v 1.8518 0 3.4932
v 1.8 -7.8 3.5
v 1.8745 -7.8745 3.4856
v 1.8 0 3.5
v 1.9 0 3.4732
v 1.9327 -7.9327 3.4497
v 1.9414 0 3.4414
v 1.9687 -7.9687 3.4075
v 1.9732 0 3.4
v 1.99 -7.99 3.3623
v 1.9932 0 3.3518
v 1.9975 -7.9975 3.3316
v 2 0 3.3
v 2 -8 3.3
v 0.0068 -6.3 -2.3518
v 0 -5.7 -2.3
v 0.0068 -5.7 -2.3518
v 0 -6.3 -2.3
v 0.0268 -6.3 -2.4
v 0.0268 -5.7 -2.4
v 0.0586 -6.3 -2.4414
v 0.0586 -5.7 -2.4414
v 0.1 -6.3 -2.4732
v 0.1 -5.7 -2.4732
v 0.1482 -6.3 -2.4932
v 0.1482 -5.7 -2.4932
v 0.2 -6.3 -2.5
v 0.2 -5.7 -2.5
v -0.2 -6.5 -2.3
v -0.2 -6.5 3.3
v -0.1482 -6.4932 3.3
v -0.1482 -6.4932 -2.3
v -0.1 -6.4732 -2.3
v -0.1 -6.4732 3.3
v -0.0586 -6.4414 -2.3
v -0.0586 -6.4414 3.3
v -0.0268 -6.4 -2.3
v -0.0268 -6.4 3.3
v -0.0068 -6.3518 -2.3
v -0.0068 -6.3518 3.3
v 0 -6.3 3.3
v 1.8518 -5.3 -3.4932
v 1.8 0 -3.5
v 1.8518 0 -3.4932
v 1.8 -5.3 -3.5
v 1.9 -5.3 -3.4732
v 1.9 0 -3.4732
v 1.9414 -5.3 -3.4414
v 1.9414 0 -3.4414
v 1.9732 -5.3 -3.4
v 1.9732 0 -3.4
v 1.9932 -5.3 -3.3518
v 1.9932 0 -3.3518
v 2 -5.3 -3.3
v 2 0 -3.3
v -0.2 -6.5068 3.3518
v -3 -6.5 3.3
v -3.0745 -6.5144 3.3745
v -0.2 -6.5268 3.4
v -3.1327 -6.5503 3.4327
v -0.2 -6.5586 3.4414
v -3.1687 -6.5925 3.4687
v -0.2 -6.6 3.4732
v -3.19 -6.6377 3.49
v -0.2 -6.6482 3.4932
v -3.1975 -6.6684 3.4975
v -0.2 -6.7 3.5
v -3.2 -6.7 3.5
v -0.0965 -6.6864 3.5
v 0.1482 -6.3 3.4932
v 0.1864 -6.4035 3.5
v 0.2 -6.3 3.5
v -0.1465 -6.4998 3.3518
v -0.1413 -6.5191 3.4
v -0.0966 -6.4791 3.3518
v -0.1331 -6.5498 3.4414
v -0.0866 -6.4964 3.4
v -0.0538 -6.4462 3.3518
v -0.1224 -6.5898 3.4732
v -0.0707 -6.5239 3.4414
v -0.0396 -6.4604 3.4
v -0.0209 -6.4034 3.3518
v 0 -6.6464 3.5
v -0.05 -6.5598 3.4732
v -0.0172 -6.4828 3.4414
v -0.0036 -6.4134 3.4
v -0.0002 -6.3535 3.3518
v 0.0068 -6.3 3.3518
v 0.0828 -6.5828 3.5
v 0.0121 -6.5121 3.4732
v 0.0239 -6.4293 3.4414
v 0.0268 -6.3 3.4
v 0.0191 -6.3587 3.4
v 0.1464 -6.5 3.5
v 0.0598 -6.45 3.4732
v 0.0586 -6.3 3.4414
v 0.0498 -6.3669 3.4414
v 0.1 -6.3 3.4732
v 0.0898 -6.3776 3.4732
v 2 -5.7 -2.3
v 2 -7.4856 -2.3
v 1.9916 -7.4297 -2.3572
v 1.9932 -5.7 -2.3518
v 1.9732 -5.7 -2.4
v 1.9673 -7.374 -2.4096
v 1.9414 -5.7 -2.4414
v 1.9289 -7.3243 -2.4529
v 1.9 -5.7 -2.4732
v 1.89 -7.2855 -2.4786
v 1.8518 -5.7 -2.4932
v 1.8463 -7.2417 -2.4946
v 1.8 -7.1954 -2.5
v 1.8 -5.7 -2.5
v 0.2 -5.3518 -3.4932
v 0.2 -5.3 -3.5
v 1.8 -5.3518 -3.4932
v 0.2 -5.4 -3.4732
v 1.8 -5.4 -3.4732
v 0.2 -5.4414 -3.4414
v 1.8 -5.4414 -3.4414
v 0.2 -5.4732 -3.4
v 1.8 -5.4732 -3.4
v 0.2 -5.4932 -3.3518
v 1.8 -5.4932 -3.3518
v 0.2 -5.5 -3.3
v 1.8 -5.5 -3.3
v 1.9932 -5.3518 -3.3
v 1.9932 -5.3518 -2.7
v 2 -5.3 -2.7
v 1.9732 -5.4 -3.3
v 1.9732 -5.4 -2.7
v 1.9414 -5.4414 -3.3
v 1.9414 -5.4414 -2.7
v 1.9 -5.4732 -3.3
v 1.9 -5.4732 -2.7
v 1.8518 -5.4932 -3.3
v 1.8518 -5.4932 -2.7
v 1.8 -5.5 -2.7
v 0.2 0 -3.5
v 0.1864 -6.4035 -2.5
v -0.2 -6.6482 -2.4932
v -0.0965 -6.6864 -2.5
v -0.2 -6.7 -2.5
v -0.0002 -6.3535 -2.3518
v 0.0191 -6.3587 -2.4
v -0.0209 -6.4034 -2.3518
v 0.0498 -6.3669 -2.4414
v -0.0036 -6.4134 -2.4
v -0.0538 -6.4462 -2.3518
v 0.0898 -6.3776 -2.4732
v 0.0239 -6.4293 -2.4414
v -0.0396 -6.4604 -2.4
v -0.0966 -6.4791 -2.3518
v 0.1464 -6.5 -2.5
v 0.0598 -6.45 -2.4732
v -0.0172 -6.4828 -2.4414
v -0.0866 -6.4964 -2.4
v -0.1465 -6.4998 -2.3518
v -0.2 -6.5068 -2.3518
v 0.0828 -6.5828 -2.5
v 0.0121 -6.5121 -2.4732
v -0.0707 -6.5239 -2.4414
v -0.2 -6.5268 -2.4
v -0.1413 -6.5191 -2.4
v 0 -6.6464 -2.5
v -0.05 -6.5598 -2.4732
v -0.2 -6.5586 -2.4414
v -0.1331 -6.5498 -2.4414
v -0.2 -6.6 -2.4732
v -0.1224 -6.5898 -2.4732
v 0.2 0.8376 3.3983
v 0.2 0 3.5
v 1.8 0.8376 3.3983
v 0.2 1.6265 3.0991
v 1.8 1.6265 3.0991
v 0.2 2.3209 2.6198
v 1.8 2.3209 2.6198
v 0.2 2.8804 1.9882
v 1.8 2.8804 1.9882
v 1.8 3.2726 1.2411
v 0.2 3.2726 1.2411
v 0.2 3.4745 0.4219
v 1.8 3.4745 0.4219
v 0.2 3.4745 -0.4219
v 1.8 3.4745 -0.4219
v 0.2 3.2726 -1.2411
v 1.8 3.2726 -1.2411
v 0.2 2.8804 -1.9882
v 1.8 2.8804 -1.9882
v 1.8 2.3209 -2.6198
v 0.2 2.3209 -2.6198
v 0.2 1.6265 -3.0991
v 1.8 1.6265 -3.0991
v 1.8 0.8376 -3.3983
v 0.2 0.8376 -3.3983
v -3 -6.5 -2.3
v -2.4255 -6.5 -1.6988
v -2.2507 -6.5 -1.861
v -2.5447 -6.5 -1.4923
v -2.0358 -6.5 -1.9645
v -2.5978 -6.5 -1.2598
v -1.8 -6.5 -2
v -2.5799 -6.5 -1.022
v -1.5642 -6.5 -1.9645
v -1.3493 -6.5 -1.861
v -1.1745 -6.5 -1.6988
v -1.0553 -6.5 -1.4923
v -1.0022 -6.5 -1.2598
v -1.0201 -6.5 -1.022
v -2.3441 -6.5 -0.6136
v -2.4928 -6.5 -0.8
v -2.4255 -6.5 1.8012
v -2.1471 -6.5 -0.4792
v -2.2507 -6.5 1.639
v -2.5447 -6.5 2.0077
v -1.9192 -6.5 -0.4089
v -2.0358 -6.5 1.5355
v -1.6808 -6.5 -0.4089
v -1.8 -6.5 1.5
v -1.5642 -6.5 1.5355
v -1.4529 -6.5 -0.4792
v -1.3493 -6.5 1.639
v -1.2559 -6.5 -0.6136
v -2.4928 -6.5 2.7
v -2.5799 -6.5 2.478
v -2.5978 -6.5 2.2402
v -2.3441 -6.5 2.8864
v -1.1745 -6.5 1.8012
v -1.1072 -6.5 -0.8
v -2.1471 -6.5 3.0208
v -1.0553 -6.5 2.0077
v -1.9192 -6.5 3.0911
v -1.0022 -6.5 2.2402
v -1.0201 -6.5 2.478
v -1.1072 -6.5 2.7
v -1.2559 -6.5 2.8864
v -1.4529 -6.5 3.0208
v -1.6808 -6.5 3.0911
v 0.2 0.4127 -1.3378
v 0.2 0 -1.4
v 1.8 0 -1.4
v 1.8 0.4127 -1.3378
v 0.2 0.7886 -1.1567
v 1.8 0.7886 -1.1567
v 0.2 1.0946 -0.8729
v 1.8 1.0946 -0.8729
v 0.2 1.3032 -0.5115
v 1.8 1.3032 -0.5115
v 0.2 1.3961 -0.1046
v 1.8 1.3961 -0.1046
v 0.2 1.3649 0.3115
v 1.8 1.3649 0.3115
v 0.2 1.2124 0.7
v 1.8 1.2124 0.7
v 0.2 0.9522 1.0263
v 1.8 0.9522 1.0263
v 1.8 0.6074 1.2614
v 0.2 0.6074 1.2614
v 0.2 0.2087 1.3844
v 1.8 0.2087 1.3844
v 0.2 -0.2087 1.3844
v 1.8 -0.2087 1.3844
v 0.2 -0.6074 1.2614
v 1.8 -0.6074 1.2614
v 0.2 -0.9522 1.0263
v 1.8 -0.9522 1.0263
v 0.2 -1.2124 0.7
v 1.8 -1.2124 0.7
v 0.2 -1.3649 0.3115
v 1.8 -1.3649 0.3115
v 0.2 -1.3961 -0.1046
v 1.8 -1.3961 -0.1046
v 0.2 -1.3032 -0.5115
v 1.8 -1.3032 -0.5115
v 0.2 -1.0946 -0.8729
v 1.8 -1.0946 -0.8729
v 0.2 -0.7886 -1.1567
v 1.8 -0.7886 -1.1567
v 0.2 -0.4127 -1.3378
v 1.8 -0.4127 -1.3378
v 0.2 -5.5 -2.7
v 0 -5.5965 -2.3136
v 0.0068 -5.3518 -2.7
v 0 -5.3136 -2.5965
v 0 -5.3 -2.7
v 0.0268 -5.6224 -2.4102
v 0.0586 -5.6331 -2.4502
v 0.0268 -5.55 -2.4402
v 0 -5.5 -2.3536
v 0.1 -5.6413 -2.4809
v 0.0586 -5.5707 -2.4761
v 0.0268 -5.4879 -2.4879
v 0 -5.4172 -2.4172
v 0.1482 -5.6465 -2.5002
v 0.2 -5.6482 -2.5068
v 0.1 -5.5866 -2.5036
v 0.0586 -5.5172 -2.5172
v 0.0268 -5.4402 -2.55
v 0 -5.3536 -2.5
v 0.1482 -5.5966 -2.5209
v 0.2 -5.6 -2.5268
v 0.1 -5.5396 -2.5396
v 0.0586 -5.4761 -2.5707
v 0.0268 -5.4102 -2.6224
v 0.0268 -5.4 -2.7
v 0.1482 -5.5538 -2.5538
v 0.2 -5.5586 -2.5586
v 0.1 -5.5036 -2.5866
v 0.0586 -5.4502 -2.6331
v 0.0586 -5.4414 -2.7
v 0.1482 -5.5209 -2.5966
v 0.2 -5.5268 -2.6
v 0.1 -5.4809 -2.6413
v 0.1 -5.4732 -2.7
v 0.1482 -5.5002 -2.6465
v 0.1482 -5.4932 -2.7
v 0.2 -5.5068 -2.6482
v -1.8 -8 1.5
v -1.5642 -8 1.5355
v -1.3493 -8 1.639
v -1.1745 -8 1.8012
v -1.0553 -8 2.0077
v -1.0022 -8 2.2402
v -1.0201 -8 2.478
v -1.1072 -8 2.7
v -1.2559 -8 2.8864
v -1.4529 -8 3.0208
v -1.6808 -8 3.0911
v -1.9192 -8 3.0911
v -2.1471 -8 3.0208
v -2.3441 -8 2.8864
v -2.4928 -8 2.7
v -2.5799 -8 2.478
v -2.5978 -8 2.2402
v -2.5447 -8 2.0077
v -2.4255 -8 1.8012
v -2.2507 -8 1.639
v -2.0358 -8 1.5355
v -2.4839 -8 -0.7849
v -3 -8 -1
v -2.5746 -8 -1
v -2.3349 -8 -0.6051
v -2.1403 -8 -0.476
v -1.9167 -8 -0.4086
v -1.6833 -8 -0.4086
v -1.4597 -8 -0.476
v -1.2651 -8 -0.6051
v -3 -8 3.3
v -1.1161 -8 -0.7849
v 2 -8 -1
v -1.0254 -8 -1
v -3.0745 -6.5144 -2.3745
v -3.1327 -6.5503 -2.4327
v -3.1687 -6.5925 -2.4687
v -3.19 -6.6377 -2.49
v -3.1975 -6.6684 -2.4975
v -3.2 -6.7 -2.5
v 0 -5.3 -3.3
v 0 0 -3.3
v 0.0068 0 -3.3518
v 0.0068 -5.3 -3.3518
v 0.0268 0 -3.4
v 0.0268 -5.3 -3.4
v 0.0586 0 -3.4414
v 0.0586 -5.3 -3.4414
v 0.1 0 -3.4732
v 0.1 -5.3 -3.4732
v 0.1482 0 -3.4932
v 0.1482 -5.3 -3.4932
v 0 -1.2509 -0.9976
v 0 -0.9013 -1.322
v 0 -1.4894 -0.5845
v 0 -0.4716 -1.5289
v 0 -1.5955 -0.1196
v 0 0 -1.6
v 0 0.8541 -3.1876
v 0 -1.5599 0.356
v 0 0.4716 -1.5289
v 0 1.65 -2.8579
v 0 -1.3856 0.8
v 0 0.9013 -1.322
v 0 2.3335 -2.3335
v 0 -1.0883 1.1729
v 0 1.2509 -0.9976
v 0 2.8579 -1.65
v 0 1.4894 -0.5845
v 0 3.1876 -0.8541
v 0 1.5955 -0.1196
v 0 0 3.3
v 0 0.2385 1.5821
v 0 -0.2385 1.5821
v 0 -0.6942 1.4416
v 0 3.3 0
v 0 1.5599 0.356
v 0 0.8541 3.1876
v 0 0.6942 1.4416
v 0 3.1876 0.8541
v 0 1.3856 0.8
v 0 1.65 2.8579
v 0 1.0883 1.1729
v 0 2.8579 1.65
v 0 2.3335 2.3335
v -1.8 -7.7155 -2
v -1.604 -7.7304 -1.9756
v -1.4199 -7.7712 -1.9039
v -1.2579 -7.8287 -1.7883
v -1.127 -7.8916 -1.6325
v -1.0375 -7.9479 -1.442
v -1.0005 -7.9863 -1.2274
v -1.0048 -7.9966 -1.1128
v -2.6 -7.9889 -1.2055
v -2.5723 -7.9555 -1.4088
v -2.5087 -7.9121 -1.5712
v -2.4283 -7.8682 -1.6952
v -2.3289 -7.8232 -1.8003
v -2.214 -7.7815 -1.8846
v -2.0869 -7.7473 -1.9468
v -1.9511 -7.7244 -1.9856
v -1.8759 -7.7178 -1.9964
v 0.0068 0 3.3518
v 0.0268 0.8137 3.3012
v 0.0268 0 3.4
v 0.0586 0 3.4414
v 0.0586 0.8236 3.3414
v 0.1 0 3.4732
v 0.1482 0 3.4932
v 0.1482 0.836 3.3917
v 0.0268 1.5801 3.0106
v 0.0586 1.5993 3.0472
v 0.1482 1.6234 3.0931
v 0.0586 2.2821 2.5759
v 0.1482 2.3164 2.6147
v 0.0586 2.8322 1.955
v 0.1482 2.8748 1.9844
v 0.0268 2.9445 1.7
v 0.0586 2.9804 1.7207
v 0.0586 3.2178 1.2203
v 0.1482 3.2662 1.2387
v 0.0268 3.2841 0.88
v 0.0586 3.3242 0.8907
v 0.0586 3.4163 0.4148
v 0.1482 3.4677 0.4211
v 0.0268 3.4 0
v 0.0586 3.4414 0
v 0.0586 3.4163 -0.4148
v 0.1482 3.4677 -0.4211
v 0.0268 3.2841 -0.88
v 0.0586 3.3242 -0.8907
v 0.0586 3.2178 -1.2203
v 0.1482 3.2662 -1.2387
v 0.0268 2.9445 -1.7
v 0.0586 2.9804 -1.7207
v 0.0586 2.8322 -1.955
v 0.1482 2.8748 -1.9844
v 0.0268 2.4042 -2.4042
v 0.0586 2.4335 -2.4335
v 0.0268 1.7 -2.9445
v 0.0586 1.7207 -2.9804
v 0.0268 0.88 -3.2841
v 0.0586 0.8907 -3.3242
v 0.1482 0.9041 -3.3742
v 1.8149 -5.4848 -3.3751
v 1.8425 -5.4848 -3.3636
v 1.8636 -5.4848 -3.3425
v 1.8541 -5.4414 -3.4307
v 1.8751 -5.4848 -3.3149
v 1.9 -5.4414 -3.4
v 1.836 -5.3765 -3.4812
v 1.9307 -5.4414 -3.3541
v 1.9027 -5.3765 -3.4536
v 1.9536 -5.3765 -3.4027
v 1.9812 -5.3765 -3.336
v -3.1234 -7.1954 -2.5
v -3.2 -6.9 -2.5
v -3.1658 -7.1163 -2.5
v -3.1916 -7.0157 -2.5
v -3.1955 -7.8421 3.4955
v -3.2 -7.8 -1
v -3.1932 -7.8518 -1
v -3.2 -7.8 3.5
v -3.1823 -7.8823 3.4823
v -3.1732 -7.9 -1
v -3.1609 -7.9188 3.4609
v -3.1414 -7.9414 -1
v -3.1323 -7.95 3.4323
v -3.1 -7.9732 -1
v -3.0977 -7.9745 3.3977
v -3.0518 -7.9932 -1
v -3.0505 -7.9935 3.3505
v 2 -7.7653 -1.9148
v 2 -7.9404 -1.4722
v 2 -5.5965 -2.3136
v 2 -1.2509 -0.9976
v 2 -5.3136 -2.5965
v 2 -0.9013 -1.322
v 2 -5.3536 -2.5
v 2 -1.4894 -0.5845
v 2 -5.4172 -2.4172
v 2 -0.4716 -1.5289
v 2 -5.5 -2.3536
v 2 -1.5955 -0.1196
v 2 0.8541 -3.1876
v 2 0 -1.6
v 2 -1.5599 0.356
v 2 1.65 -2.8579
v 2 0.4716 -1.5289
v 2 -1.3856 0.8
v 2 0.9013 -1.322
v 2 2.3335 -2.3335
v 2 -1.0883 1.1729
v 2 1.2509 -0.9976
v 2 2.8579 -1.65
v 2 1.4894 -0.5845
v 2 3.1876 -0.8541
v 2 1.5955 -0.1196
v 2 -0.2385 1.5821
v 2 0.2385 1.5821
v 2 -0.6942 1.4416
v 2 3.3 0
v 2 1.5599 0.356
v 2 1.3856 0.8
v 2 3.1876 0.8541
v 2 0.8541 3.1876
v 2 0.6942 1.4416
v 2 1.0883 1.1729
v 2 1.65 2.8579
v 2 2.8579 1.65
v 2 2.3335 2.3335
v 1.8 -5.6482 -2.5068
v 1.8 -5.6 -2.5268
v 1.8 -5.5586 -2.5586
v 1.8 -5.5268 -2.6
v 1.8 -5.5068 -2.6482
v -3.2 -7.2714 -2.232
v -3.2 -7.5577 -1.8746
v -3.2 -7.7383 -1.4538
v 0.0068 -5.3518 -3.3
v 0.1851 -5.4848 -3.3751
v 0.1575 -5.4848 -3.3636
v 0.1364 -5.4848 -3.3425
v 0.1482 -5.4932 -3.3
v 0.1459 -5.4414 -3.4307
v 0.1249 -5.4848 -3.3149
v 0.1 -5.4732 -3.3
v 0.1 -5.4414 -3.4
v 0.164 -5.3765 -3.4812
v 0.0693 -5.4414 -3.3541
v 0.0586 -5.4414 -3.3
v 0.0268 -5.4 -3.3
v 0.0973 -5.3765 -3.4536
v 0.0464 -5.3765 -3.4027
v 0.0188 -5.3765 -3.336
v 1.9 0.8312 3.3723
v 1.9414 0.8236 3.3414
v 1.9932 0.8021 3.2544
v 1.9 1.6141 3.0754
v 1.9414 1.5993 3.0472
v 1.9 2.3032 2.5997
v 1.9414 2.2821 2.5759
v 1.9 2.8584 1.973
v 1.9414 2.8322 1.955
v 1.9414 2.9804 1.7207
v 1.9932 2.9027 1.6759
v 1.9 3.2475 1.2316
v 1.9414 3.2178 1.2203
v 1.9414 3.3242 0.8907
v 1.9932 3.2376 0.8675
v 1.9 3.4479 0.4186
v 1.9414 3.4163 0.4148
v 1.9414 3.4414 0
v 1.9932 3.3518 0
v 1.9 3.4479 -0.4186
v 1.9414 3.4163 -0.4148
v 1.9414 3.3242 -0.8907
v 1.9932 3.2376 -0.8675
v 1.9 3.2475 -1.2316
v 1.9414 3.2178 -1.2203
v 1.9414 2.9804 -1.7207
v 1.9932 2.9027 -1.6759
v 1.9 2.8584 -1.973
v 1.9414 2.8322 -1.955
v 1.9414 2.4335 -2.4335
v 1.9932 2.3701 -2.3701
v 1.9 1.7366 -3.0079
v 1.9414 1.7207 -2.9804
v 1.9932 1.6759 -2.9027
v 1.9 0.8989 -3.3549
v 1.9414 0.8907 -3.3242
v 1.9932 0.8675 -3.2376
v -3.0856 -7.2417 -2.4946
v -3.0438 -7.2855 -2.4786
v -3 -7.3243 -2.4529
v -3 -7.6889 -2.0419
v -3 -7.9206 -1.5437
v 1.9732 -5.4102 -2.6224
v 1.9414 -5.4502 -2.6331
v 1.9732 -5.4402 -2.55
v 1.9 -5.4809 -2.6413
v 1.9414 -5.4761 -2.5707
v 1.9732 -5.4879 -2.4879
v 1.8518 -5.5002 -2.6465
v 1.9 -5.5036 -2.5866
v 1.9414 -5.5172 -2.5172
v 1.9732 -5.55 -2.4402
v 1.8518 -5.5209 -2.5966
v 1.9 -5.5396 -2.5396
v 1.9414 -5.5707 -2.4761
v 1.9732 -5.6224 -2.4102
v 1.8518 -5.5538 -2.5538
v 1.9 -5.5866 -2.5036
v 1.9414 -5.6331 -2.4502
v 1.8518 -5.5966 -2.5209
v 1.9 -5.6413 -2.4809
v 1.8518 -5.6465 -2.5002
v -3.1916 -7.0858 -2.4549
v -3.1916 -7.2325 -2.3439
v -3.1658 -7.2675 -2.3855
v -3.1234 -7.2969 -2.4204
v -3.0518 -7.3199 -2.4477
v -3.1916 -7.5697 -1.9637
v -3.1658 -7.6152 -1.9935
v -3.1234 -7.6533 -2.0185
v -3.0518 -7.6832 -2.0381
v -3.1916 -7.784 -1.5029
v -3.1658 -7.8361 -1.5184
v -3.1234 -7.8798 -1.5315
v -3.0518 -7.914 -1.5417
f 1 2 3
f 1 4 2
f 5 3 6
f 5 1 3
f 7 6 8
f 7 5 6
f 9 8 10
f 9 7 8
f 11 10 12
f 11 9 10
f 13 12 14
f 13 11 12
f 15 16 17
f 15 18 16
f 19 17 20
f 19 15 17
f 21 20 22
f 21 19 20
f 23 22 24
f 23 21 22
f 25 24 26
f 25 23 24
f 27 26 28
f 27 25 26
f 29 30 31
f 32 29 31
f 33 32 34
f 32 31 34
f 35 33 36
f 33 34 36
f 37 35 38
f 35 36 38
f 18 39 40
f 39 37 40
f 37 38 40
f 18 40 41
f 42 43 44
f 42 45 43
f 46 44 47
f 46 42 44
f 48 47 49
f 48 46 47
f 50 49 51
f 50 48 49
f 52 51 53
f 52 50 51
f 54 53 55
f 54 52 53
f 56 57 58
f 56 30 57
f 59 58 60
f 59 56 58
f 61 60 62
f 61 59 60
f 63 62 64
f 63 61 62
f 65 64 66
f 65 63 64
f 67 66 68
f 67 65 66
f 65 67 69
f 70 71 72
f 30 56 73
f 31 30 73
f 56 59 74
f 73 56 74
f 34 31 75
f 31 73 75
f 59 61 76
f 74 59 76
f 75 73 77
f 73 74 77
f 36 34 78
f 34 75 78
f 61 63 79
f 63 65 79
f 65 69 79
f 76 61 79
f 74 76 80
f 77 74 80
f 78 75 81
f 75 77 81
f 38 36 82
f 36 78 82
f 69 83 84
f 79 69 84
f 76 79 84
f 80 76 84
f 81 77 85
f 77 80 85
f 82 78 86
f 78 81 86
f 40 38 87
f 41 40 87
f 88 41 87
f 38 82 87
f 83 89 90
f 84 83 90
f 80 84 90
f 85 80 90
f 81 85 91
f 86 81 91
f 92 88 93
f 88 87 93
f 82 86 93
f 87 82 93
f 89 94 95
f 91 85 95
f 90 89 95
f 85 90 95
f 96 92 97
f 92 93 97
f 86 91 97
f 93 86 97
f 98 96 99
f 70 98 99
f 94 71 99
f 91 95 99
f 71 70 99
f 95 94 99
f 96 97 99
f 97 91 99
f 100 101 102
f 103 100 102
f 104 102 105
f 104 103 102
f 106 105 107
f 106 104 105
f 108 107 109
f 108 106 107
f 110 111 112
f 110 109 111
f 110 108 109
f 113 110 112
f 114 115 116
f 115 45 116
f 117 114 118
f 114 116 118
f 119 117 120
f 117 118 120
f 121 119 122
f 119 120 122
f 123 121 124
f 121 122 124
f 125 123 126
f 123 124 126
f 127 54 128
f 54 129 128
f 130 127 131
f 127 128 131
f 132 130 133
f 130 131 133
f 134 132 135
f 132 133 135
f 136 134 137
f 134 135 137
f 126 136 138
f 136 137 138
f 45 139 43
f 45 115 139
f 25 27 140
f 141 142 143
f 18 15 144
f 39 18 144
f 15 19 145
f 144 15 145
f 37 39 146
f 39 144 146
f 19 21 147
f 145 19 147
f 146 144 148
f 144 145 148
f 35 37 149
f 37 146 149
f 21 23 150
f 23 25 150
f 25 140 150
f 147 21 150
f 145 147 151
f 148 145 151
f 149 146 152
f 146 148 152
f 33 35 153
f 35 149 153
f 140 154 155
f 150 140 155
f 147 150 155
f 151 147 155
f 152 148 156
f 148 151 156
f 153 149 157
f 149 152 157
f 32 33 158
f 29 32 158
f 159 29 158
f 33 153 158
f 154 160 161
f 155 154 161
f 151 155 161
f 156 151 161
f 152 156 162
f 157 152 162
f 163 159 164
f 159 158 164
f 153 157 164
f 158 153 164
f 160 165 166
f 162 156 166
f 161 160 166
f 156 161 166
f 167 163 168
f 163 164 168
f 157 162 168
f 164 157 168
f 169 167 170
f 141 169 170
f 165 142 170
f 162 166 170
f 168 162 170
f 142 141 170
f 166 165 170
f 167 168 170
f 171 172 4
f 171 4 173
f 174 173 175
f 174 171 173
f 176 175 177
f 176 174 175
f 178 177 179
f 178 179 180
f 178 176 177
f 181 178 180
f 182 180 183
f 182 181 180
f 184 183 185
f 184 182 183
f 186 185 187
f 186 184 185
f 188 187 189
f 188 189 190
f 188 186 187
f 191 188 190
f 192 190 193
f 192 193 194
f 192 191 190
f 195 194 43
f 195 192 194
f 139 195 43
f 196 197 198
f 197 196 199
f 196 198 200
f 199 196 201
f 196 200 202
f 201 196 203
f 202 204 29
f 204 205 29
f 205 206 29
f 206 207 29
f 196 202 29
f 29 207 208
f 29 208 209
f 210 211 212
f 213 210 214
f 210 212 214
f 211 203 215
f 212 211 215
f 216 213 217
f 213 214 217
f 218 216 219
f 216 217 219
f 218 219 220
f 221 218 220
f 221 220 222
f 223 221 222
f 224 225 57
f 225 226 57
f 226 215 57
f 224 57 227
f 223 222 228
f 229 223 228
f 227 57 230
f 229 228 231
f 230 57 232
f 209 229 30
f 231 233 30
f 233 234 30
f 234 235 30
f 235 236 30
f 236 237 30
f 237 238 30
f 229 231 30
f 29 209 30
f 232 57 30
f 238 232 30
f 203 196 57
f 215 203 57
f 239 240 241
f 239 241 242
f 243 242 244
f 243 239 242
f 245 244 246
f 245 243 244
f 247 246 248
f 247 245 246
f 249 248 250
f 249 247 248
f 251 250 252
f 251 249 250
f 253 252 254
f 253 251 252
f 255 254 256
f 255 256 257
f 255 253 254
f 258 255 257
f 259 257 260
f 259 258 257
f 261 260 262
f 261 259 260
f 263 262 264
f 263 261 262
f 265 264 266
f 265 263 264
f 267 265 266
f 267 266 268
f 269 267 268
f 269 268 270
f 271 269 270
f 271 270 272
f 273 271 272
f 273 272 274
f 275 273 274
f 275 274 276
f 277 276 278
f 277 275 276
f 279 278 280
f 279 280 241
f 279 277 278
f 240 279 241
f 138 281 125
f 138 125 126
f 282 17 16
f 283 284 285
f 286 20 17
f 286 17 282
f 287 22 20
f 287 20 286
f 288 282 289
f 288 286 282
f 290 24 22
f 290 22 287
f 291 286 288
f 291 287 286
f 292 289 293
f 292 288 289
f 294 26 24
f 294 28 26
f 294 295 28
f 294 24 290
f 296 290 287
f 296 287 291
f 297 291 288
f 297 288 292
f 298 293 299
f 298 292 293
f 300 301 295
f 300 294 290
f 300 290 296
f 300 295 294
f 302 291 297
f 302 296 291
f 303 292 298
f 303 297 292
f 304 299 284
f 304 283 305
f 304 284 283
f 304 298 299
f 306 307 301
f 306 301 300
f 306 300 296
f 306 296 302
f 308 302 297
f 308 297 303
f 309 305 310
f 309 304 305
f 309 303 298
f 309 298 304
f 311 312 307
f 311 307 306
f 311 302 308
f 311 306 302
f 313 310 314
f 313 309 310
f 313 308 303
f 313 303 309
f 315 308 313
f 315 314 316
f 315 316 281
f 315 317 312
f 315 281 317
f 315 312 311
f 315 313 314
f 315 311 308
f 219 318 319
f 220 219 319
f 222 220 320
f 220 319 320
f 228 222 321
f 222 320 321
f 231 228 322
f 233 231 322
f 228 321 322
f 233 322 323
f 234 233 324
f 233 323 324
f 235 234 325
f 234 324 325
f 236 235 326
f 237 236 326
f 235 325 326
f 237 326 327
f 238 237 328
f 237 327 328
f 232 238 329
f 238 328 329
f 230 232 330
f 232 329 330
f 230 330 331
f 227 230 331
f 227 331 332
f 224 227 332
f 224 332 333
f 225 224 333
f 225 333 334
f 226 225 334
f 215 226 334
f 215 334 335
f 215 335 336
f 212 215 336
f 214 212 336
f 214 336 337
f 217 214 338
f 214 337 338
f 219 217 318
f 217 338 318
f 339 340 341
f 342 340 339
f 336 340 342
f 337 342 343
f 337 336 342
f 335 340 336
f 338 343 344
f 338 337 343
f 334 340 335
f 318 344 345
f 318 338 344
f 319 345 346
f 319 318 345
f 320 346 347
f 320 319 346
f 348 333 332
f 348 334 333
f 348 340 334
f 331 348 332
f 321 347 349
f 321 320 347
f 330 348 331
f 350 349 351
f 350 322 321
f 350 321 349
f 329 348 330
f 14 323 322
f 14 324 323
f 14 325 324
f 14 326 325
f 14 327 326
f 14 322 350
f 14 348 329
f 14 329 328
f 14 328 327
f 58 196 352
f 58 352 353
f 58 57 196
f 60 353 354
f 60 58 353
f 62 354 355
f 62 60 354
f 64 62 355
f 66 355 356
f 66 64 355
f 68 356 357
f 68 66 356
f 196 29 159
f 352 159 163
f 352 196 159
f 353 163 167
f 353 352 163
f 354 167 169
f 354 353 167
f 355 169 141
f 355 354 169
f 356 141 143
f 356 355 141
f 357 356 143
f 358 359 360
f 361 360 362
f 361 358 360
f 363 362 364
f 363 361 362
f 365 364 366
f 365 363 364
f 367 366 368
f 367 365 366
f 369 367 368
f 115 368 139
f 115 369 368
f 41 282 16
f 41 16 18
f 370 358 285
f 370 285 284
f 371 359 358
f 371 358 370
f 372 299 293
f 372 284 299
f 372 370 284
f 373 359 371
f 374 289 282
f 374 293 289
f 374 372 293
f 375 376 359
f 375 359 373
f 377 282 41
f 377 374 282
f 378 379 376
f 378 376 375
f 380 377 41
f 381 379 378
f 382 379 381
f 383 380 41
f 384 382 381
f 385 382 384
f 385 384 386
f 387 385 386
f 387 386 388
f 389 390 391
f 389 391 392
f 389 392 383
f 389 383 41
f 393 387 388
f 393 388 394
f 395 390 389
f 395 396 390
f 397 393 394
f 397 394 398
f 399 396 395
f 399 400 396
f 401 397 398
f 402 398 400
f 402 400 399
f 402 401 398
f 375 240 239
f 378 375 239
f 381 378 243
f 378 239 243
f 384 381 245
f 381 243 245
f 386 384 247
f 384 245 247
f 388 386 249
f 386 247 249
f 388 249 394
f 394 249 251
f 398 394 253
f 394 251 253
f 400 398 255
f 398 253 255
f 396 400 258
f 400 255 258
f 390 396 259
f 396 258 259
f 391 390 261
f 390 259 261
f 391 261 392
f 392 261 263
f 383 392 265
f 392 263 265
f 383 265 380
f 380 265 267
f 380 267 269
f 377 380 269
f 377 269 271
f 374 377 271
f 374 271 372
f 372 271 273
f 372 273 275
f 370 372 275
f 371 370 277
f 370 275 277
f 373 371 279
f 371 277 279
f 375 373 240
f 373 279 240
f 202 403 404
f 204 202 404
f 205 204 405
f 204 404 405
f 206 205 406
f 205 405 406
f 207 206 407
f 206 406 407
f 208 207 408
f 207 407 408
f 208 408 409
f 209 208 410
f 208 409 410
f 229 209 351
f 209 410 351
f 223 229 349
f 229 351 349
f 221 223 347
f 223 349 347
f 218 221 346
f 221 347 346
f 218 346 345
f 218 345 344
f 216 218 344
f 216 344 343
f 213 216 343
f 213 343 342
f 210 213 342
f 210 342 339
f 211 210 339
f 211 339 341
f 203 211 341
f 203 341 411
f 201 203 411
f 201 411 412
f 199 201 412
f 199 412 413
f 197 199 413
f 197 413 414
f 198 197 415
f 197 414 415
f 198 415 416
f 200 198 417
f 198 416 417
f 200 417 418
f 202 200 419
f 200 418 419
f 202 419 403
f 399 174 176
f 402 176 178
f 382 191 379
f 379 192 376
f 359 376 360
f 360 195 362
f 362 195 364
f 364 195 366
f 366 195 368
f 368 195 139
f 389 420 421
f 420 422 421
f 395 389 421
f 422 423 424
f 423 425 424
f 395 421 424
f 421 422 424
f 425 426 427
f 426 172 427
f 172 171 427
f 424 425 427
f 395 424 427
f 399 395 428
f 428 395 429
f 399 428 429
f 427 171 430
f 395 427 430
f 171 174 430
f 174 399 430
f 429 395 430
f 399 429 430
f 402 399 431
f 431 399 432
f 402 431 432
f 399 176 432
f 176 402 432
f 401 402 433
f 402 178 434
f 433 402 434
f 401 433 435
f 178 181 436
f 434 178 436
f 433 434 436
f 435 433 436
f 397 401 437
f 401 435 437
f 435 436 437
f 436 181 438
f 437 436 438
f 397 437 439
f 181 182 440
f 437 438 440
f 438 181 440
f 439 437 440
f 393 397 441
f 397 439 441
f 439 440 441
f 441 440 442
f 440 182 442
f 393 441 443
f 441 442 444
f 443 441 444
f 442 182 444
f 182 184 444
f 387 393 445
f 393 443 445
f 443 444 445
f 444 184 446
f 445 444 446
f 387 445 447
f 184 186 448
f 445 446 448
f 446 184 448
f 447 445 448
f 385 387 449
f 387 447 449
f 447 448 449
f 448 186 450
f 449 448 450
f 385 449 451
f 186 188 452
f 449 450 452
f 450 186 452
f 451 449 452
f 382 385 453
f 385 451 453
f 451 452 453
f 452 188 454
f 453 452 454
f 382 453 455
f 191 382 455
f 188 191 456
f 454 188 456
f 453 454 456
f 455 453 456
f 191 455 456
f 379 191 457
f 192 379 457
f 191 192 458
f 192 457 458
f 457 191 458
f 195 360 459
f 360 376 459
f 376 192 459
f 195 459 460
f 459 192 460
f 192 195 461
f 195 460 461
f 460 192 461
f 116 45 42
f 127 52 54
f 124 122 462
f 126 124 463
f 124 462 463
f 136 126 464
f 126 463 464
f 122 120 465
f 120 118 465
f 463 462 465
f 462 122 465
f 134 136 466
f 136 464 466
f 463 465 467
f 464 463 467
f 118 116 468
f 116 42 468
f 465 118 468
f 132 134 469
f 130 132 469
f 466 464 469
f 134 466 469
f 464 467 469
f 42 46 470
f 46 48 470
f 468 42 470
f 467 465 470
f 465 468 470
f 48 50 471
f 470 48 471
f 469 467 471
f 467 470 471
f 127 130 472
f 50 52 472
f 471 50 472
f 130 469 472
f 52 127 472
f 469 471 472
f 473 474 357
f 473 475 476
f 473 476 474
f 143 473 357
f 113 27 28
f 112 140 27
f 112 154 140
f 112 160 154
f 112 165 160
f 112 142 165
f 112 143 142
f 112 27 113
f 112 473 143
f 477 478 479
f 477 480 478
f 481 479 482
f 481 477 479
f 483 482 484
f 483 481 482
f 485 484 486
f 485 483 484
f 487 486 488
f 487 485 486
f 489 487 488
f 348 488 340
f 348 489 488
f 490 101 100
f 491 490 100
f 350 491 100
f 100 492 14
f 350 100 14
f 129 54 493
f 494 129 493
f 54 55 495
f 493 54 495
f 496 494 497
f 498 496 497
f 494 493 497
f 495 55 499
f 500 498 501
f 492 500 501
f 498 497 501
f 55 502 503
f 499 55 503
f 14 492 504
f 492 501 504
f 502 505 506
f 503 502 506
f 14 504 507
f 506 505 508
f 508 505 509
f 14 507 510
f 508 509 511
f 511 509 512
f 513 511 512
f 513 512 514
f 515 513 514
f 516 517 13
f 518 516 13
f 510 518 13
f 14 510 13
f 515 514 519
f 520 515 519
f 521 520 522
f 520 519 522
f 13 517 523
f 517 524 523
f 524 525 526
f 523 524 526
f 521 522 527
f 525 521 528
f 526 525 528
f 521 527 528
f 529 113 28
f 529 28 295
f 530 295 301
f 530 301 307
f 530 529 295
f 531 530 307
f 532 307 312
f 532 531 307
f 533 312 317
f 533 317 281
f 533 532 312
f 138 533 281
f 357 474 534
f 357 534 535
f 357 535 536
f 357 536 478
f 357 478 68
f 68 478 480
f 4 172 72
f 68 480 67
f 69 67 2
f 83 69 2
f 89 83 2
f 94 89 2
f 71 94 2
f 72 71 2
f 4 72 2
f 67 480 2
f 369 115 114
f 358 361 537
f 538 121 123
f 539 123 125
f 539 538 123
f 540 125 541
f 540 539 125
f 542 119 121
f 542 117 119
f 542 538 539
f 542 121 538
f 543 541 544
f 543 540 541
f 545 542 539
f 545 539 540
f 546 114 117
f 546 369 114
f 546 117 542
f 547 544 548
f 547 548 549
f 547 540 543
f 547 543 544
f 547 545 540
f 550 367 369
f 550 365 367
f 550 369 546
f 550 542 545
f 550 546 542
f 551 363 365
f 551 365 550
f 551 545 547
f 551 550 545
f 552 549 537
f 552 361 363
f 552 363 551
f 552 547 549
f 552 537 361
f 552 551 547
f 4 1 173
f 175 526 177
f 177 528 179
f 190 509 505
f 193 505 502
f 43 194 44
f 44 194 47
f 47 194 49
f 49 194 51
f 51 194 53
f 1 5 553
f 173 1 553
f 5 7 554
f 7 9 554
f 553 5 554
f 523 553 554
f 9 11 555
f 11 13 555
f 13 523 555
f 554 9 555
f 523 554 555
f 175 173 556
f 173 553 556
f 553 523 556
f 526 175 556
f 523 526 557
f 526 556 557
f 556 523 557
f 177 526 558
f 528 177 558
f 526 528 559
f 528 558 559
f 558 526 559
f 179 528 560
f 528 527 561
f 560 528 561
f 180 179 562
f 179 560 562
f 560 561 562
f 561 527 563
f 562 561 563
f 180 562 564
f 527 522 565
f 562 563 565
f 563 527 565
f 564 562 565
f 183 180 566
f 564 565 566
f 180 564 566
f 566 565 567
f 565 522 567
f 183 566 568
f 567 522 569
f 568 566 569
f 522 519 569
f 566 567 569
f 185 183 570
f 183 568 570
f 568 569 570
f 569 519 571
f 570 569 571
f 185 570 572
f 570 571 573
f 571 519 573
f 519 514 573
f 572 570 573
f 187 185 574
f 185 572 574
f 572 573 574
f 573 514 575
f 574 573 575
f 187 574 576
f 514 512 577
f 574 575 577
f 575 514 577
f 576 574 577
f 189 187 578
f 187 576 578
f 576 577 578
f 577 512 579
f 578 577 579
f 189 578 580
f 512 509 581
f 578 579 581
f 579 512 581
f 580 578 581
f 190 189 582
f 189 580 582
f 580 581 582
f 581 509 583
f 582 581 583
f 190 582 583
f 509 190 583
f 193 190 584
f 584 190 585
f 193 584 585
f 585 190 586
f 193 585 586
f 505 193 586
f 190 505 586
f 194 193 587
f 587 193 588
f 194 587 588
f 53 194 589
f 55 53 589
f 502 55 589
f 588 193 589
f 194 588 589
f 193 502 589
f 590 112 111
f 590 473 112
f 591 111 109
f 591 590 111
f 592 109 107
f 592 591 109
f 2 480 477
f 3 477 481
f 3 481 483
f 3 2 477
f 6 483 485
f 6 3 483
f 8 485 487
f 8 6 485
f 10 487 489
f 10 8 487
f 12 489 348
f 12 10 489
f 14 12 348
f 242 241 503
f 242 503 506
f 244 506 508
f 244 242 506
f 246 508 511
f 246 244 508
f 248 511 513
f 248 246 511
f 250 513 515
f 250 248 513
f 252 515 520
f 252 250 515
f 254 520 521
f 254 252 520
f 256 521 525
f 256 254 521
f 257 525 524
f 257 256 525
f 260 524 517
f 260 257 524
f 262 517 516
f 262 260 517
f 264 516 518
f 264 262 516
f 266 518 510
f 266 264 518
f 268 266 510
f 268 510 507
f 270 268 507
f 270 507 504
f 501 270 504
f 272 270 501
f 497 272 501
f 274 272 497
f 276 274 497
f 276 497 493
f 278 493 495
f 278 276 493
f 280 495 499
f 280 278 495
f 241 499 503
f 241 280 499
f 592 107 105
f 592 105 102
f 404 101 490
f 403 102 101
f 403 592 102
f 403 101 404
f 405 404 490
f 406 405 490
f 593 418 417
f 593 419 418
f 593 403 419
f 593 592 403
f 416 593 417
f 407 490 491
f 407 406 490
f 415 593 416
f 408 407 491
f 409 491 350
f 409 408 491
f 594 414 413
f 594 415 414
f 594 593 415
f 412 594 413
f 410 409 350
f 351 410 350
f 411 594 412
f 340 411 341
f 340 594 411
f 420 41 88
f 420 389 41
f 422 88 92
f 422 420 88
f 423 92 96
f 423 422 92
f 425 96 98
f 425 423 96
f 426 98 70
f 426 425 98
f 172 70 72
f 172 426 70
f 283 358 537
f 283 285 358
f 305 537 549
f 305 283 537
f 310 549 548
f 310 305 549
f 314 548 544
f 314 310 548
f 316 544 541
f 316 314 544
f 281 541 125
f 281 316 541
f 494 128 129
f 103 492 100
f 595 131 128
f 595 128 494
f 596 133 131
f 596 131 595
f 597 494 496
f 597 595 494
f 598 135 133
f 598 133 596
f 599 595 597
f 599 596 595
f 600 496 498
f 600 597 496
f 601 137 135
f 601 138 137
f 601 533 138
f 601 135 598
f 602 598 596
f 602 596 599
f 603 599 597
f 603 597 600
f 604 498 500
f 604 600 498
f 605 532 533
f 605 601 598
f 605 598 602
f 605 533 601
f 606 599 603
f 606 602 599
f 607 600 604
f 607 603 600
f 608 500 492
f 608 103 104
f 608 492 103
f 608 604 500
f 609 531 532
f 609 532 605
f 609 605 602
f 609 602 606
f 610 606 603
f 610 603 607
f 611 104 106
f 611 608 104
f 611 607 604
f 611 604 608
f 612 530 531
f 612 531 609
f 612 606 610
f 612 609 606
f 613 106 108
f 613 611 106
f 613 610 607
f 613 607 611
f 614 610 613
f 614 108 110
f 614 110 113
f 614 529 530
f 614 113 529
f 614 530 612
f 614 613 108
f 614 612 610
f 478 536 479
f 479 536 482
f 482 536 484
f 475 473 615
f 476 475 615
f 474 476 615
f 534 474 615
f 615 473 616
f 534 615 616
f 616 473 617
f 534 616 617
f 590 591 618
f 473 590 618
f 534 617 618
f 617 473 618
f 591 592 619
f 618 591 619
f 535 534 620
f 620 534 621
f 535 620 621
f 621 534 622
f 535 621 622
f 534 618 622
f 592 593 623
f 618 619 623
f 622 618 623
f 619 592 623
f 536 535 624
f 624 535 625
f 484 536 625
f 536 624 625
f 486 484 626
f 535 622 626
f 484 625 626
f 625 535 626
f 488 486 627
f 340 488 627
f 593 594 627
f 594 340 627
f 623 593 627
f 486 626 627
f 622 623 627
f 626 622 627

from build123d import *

# Parameters (mm, degrees)
SKETCH_1_R          = 1.4
EXTRUDE_1_DEPTH     = 2
SKETCH_2_W          = 5.2
SKETCH_2_H          = 7
SKETCH_2_R          = 0.8
EXTRUDE_2_DEPTH     = 1.5
SKETCH_5_W          = 6
SKETCH_5_H          = 1
CUT_EXTRUDE_1_DEPTH = 2.5
CUT_EXTRUDE_2_REACH = 12.163
FILLET_1_R          = 0.2
FILLET_2_R          = 0.2
CHAMFER_1_SIZE      = 0.2


with BuildPart() as part:
    # 草图1 → 凸台-拉伸1 (new body)
    with BuildSketch(Plane(origin=(0, 0, 0), x_dir=(0, 0, -1), z_dir=(1, 0, 0))):
        with BuildLine():
            Line((3.5, 0), (3.5, -8))
            Line((3.5, -8), (-3.5, -8))
            Line((-3.5, -8), (-3.5, 0))
            ThreePointArc((-3.5, 0), (0, 3.5), (3.5, 0))
        make_face()
        Circle(SKETCH_1_R, mode=Mode.SUBTRACT)
    extrude(amount=EXTRUDE_1_DEPTH)

    # 草图2 → 凸台-拉伸2 (add)
    with BuildSketch(Plane.XZ.offset(8)):
        with Locations((-0.6, 0)):
            Rectangle(SKETCH_2_W, SKETCH_2_H)
        with Locations(Location((-1.8, -1.2, 0), (0, 0, 270))):
            Circle(SKETCH_2_R, mode=Mode.SUBTRACT)
        with Locations(Location((-1.8, 2.3, 0), (0, 0, 270))):
            Circle(SKETCH_2_R, mode=Mode.SUBTRACT)
    extrude(amount=-EXTRUDE_2_DEPTH)

    # 草图5 → 切除-拉伸1 (cut)
    with BuildSketch(Plane.XZ.offset(8)):
        with Locations((-1, -3)):
            Rectangle(SKETCH_5_W, SKETCH_5_H)
    extrude(amount=-CUT_EXTRUDE_1_DEPTH, mode=Mode.SUBTRACT)

    # 草图6 → 切除-拉伸2 (cut, up to next)
    with BuildSketch(Plane.ZY.offset(3.2), mode=Mode.PRIVATE) as cut_extrude_2_sk1:
        with BuildLine():
            Line((-1, -8.325127743), (-3.27705392, -8.325127743))
            Line((-3.27705392, -8.325127743), (-3.27705392, -6))
            Line((-3.27705392, -6), (-2.897366596, -6))
            ThreePointArc((-2.897366596, -6), (-2.378404875, -7.407669683), (-1, -8))
            Line((-1, -8), (-1, -8.325127743))
        make_face()
    cut_extrude_2_tool1 = extrude(cut_extrude_2_sk1.sketch, amount=-CUT_EXTRUDE_2_REACH, mode=Mode.PRIVATE) & part.part
    add(cut_extrude_2_tool1.solids().sort_by_distance((-3.2, -7.575754, -2.569334))[0], mode=Mode.SUBTRACT)

    # 圆角1
    fillet_1_edges = [part.edges().sort_by_distance(p)[0] for p in [
        (0, -6.5, 0.5),
    ]]
    fillet(fillet_1_edges, radius=FILLET_1_R)

    # 圆角2
    fillet_2_edges = [part.edges().sort_by_distance(p)[0] for p in [
        (2, 3.5, 0),
        (2, -4, 3.5),
        (-3.2, -8, 1.25),
        (-3.2, -6.5, 0.5),
        (0, -2.75, -3.5),
        (2, -2.75, -3.5),
        (0, -3.15, 3.5),
        (1, -5.5, -2.5),
        (0, -5.9, -2.5),
        (1, -5.5, -3.5),
        (0, 3.5, 0),
        (2, -5.5, -3),
        (2, -6.383095189, -2.5),
        (0, -5.5, -3),
        (-3.2, -7.806716397, -1.834936608),
        (-0.6, -7.266190379, -2.5),
        (-0.6, -8, 3.5),
        (-1.7, -6.5, -2.5),
        (-1.7, -6.5, 3.5),
        (-0.058578644, -6.441421356, -2.5),
        (-0.058578644, -6.441421356, 3.5),
    ]]
    fillet(fillet_2_edges, radius=FILLET_2_R)

    # 倒角1
    chamfer_1_edges = [part.edges().sort_by_distance(p)[0] for p in [
        (0, 0, 1.4),
        (2, 0, 1.4),
    ]]
    chamfer(chamfer_1_edges, length=CHAMFER_1_SIZE)


solid = part.part
